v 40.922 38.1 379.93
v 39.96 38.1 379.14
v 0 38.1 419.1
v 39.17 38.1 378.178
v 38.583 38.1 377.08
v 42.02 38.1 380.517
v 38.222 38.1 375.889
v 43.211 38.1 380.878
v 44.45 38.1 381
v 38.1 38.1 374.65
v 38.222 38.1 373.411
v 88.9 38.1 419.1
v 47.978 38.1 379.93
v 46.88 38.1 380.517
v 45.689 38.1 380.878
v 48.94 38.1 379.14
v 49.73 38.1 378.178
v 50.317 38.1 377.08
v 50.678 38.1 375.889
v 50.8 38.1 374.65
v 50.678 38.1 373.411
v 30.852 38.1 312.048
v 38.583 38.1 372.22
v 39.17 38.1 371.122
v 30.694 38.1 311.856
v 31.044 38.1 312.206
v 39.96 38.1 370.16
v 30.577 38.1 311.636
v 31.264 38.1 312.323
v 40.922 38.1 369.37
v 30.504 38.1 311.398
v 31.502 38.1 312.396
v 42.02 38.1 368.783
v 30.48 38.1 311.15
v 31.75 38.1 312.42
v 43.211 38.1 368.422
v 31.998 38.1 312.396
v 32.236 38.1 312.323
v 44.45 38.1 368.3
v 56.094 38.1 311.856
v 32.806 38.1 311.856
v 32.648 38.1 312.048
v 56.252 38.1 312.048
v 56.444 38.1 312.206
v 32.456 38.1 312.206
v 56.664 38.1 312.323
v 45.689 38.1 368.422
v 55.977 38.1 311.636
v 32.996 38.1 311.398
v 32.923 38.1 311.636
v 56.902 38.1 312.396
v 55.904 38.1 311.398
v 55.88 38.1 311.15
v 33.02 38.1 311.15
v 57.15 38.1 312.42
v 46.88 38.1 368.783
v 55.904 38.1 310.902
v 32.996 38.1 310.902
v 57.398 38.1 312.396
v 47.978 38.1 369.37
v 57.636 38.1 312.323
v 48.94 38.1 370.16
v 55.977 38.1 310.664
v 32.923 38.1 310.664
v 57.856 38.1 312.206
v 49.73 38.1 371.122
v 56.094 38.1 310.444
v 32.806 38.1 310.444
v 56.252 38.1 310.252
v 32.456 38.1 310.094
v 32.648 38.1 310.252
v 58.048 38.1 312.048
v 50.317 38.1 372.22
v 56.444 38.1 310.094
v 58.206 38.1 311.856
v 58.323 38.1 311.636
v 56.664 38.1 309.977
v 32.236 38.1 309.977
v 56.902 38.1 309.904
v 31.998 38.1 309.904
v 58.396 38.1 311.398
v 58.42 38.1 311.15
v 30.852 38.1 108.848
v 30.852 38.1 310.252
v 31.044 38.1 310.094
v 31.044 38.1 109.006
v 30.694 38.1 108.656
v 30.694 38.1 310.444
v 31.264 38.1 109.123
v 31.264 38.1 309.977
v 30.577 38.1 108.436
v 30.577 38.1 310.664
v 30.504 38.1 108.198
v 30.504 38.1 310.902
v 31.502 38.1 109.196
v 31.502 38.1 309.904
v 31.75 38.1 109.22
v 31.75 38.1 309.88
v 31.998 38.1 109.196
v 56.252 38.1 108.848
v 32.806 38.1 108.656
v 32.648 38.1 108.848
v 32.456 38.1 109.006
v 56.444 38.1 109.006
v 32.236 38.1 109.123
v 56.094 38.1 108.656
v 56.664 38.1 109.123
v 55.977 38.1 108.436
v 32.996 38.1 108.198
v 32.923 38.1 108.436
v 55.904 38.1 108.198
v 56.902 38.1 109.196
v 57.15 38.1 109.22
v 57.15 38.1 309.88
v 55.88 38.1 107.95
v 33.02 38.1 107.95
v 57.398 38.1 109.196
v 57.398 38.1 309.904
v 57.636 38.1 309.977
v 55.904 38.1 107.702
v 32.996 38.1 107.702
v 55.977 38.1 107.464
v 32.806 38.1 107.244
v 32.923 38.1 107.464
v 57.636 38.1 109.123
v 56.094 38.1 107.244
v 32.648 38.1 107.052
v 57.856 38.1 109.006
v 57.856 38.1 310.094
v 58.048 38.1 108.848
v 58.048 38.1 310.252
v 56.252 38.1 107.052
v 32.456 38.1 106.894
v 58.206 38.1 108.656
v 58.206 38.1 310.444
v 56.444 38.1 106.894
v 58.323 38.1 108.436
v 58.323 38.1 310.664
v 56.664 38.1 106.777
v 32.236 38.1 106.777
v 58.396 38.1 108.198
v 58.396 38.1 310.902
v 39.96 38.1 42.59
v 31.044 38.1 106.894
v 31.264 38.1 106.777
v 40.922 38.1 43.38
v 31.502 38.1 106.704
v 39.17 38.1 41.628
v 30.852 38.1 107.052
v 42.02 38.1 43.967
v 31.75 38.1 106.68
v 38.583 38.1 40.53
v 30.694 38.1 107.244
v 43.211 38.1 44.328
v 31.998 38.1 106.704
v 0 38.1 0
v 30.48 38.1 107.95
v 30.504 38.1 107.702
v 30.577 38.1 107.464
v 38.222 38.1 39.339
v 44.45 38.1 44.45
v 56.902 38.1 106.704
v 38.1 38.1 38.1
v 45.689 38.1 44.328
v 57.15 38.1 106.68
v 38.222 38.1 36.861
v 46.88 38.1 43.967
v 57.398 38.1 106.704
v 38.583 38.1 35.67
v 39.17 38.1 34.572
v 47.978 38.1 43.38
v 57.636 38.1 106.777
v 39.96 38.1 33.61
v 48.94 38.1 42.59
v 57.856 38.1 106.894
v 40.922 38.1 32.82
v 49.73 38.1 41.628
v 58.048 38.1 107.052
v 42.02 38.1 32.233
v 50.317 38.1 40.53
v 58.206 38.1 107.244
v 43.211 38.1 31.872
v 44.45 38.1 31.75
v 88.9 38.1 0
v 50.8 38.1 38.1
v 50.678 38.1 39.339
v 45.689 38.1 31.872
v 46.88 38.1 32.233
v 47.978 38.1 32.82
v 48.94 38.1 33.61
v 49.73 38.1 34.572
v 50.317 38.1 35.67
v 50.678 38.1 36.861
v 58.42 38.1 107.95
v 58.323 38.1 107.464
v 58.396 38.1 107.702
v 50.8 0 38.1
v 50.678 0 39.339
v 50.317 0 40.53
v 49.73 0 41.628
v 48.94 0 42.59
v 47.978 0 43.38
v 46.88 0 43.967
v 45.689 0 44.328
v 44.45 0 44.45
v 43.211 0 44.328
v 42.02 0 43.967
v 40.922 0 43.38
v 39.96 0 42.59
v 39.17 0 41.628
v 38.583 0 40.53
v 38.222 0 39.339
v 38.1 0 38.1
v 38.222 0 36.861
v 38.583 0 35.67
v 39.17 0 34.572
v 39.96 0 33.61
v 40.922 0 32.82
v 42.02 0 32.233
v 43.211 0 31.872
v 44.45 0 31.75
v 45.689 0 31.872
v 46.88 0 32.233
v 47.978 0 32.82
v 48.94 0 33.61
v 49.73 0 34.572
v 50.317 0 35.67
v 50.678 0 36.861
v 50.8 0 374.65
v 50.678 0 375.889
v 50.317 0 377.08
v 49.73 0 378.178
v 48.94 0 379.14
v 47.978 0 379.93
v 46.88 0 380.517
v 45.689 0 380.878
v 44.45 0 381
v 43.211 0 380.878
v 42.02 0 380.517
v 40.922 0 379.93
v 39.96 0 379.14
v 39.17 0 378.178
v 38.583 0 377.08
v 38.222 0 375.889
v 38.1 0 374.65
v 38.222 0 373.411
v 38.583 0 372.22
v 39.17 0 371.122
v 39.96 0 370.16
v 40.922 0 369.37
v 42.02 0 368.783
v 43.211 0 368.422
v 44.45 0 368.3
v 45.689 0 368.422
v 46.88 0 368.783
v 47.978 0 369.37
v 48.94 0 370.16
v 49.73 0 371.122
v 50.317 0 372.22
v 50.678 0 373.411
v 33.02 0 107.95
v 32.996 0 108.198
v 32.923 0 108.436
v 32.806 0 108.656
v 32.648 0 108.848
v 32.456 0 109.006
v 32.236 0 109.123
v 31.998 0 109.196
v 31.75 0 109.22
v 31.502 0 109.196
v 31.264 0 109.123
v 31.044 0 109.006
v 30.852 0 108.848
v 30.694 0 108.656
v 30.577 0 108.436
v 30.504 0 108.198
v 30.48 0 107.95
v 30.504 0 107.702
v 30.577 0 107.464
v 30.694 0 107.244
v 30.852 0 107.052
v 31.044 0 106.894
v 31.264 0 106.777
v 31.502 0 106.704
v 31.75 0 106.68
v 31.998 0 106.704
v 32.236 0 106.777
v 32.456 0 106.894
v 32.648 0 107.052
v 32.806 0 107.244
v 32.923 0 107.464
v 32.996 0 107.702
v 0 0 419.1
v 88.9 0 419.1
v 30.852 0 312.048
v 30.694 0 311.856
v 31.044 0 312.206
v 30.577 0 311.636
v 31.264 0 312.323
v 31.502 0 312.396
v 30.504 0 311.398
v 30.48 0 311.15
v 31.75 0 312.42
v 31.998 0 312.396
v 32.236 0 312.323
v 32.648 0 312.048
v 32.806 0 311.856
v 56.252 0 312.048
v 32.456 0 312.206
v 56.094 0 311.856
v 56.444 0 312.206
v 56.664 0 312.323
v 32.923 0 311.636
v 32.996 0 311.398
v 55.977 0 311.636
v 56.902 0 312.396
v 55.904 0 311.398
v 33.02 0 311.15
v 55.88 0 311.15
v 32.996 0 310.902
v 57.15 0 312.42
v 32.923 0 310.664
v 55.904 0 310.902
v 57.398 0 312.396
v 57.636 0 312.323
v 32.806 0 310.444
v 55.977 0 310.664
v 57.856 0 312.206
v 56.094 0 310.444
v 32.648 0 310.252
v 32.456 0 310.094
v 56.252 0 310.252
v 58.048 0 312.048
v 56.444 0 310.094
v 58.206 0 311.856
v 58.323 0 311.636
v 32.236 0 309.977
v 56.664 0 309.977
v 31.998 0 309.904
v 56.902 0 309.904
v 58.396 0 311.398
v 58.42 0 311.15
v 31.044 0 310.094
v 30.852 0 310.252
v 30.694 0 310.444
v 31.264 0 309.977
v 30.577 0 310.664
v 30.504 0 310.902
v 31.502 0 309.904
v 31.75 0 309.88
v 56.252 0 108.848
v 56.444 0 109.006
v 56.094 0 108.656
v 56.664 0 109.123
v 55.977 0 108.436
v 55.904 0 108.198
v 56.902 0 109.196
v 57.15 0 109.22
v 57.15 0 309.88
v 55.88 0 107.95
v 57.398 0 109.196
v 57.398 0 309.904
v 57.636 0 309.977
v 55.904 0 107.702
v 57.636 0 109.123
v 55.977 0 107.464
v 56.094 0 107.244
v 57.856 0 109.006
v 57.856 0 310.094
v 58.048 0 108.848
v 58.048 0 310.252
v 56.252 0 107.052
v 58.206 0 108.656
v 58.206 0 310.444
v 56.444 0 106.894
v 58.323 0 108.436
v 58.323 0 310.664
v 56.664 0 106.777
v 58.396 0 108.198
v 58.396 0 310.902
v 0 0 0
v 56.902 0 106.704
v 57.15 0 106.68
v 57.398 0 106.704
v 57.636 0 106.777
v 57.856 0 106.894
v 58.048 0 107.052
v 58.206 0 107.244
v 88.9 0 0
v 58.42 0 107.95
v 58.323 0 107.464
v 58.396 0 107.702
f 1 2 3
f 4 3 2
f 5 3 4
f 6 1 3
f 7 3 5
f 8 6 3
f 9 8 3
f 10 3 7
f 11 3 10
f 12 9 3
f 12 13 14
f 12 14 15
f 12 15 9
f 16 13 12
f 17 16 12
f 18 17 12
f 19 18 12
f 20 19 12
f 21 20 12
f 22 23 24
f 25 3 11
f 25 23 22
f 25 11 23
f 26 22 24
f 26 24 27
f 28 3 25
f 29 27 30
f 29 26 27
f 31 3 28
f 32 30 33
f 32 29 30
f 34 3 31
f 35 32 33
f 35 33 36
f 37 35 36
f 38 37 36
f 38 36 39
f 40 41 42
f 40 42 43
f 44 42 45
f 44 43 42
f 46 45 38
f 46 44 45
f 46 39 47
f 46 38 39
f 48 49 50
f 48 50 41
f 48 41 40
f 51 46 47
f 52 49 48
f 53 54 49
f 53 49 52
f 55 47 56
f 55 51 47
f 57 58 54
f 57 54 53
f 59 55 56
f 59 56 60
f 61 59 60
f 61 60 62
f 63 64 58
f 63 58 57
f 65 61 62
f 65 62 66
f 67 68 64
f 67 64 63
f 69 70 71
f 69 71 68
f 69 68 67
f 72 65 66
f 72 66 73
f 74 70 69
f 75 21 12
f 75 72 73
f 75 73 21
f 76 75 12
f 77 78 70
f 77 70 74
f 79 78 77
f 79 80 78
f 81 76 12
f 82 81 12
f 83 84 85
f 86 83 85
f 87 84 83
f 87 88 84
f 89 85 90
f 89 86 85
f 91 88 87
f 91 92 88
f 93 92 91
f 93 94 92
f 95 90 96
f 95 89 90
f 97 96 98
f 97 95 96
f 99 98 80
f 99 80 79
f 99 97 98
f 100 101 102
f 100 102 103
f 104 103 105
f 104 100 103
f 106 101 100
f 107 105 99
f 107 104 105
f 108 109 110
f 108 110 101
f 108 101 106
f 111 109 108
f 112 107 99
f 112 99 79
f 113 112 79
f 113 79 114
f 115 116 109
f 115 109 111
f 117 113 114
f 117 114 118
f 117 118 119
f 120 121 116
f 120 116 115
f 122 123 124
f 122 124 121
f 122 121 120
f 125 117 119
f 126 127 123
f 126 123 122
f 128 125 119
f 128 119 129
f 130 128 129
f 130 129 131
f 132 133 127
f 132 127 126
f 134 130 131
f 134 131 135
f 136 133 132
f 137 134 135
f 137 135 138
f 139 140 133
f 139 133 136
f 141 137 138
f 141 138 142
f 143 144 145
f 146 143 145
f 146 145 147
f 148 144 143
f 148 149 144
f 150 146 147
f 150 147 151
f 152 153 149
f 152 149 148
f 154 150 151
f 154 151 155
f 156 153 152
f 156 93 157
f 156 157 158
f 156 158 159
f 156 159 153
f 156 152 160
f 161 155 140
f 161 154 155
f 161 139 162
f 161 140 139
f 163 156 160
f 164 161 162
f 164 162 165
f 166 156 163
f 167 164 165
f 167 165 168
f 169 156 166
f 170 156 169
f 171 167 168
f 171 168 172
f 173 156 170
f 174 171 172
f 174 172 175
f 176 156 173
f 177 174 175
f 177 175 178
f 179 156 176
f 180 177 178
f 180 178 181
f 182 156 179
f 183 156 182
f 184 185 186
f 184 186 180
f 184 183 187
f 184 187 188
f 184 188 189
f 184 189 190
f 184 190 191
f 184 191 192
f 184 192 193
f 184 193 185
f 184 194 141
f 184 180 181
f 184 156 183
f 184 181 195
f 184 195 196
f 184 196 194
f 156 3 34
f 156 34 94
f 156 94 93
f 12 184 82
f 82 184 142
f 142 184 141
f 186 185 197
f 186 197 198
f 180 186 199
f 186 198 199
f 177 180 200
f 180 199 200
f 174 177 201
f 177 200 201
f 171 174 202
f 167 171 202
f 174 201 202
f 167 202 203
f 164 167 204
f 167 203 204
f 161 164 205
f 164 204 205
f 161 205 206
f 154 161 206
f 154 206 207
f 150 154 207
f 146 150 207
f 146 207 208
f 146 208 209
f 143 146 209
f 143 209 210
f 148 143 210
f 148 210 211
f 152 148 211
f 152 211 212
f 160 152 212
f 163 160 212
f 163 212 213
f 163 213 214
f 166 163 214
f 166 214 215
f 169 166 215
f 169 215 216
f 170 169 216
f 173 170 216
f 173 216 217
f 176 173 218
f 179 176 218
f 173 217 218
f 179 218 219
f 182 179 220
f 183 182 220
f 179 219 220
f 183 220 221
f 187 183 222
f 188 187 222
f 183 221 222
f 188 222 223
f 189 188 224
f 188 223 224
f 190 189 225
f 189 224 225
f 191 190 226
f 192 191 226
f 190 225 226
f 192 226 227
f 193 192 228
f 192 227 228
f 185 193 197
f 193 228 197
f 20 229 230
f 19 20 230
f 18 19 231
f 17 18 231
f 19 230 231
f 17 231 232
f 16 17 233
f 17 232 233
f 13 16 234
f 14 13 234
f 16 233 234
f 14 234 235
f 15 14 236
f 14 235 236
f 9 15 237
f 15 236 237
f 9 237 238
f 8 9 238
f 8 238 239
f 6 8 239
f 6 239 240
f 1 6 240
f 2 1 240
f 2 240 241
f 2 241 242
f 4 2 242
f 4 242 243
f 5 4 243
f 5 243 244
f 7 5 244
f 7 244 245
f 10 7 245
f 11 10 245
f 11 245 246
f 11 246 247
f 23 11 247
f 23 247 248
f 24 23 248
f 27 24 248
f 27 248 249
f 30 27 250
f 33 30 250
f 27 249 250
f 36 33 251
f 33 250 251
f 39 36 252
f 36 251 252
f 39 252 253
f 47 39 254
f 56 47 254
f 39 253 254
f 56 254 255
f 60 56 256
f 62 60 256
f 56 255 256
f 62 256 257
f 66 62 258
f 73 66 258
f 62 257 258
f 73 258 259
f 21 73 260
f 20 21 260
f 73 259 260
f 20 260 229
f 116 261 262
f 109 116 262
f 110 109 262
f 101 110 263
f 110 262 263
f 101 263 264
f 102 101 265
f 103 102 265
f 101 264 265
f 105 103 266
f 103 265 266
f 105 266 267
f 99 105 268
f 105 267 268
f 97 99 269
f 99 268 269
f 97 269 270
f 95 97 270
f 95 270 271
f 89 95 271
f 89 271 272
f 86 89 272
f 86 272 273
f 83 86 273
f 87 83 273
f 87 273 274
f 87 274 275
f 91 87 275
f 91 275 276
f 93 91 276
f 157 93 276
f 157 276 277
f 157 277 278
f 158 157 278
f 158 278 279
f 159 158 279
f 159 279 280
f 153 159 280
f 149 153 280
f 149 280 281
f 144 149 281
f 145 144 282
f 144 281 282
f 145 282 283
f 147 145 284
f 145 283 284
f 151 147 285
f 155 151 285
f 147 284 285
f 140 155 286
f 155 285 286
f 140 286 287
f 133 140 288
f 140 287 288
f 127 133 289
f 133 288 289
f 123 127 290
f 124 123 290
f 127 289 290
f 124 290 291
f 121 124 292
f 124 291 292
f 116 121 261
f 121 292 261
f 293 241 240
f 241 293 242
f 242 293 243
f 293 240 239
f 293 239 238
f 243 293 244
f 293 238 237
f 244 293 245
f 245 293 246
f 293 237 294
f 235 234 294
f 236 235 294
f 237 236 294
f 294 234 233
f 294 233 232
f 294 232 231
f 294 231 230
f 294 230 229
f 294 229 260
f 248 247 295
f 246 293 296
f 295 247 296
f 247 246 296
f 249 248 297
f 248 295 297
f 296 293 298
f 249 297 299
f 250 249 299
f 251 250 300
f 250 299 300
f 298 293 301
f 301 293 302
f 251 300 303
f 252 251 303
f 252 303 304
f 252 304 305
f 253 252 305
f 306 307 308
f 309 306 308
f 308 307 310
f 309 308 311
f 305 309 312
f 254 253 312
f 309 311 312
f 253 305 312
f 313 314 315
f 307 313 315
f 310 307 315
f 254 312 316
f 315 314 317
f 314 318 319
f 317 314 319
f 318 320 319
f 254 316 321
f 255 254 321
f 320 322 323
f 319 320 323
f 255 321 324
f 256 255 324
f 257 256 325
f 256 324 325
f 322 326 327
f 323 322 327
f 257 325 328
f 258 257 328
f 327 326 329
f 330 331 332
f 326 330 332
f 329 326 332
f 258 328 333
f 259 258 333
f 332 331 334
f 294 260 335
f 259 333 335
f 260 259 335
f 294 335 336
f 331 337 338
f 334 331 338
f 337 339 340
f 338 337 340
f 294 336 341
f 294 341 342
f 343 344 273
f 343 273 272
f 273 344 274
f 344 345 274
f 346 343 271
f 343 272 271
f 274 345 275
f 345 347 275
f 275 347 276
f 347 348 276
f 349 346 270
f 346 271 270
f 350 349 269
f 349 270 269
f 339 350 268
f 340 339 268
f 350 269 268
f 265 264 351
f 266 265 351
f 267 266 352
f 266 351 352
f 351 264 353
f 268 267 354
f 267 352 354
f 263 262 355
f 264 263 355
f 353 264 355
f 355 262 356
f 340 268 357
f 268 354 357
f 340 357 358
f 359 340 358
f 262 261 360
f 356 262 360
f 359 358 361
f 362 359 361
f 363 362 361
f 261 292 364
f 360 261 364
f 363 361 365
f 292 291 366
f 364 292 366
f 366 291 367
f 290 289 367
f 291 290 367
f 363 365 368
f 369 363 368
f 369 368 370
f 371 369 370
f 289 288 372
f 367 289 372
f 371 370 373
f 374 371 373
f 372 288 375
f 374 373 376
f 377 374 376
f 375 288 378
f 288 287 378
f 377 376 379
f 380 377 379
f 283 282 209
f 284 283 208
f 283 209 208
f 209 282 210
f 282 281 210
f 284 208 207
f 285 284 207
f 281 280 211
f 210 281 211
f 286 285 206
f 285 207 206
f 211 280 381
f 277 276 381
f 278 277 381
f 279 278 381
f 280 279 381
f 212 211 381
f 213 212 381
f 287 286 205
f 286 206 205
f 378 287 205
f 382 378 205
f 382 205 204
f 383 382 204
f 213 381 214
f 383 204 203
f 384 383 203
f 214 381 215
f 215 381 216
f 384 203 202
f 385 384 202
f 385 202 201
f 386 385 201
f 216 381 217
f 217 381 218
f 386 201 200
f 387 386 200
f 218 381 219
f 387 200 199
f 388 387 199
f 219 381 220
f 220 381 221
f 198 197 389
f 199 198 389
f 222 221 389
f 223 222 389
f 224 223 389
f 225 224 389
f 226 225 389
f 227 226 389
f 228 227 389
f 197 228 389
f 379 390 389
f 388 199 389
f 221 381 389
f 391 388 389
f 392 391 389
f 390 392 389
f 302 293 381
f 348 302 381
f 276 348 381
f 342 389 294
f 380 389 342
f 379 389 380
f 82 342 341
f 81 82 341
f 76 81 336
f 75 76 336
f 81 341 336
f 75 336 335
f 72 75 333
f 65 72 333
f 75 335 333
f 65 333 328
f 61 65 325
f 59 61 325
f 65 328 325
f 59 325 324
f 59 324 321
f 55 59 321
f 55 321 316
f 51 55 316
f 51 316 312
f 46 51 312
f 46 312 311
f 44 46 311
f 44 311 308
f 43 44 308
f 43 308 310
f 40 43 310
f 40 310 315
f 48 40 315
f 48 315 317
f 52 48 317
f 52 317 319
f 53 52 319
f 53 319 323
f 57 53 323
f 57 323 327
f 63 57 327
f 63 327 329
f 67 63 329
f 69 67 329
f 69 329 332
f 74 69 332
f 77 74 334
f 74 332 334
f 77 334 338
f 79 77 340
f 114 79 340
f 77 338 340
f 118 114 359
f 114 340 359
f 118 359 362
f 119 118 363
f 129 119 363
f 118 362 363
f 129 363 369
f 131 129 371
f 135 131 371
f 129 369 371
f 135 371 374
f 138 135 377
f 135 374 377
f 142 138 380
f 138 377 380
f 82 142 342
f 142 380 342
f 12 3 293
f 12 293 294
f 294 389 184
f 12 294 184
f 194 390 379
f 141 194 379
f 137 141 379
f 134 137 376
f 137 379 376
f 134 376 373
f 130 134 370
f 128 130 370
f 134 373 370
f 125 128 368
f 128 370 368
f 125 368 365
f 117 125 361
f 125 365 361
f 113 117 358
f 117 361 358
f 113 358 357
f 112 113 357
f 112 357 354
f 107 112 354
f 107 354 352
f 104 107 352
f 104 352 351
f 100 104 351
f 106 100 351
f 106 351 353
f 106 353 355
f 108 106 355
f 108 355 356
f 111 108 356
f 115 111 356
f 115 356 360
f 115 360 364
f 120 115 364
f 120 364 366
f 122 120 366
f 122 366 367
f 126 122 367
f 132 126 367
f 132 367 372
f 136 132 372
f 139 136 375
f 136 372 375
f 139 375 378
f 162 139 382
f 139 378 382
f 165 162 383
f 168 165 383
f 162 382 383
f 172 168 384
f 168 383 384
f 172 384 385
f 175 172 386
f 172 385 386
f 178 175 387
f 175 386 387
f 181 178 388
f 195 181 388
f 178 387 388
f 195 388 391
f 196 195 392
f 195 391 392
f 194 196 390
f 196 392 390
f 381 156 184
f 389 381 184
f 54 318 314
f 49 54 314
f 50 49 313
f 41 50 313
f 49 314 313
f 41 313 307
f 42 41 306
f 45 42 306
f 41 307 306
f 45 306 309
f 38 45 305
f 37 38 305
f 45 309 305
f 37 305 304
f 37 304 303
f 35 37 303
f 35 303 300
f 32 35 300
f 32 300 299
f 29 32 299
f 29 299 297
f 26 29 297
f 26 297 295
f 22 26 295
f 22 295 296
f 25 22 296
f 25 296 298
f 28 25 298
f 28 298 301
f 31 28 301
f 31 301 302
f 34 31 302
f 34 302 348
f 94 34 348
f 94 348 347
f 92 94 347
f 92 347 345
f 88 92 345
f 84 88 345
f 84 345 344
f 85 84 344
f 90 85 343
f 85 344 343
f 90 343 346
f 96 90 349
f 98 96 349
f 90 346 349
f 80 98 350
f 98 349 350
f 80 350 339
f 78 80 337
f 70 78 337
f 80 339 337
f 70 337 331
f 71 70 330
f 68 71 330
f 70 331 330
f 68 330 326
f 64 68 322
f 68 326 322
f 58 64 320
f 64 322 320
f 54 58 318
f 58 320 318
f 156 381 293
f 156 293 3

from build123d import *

# Parameters (mm, degrees)
SKETCH001_AS_DRAWN_R                 = 6.35
SKETCH001_AS_DRAWN_R_2               = 1.27
EXTRUDE001_DEPTH                     = 76.2
EXTRUDE001_ONTO_SKETCH001_ROLL_ANGLE = 90
SKETCH_W                             = 88.9
SKETCH_H                             = 38.1
EXTRUDE_DEPTH                        = 419.1


with BuildPart() as extrude001:
    # Sketch001 as drawn → Extrude001 (new)
    with BuildSketch(Plane.XY):
        with Locations((44.45, 374.65)):
            Circle(SKETCH001_AS_DRAWN_R)
        with Locations((44.45, 38.1)):
            Circle(SKETCH001_AS_DRAWN_R)
        with Locations((31.75, 311.15)):
            Circle(SKETCH001_AS_DRAWN_R_2)
        with Locations((57.15, 311.15)):
            Circle(SKETCH001_AS_DRAWN_R_2)
        with Locations((31.75, 107.95)):
            Circle(SKETCH001_AS_DRAWN_R_2)
        with Locations((57.15, 107.95)):
            Circle(SKETCH001_AS_DRAWN_R_2)
    extrude(amount=-EXTRUDE001_DEPTH)


with BuildPart() as extrude001_1:
    # Extrude001 onto Sketch001 roll: moved
    add(extrude001.part.rotate(Axis((0, 0, 0), (1, 0, 0)), EXTRUDE001_ONTO_SKETCH001_ROLL_ANGLE))


with BuildPart() as extrude001_2:
    # Extrude001 onto Sketch001 placement: moved
    add(extrude001_1.part)


with BuildPart() as cut:
    # Sketch → Extrude (new body)
    with BuildSketch(Plane.XY):
        with Locations((44.45, 19.05)):
            Rectangle(SKETCH_W, SKETCH_H)
    extrude(amount=EXTRUDE_DEPTH)

    # Cut: cut Extrude001
    add(extrude001_2.part, mode=Mode.SUBTRACT)


solid = cut.part
